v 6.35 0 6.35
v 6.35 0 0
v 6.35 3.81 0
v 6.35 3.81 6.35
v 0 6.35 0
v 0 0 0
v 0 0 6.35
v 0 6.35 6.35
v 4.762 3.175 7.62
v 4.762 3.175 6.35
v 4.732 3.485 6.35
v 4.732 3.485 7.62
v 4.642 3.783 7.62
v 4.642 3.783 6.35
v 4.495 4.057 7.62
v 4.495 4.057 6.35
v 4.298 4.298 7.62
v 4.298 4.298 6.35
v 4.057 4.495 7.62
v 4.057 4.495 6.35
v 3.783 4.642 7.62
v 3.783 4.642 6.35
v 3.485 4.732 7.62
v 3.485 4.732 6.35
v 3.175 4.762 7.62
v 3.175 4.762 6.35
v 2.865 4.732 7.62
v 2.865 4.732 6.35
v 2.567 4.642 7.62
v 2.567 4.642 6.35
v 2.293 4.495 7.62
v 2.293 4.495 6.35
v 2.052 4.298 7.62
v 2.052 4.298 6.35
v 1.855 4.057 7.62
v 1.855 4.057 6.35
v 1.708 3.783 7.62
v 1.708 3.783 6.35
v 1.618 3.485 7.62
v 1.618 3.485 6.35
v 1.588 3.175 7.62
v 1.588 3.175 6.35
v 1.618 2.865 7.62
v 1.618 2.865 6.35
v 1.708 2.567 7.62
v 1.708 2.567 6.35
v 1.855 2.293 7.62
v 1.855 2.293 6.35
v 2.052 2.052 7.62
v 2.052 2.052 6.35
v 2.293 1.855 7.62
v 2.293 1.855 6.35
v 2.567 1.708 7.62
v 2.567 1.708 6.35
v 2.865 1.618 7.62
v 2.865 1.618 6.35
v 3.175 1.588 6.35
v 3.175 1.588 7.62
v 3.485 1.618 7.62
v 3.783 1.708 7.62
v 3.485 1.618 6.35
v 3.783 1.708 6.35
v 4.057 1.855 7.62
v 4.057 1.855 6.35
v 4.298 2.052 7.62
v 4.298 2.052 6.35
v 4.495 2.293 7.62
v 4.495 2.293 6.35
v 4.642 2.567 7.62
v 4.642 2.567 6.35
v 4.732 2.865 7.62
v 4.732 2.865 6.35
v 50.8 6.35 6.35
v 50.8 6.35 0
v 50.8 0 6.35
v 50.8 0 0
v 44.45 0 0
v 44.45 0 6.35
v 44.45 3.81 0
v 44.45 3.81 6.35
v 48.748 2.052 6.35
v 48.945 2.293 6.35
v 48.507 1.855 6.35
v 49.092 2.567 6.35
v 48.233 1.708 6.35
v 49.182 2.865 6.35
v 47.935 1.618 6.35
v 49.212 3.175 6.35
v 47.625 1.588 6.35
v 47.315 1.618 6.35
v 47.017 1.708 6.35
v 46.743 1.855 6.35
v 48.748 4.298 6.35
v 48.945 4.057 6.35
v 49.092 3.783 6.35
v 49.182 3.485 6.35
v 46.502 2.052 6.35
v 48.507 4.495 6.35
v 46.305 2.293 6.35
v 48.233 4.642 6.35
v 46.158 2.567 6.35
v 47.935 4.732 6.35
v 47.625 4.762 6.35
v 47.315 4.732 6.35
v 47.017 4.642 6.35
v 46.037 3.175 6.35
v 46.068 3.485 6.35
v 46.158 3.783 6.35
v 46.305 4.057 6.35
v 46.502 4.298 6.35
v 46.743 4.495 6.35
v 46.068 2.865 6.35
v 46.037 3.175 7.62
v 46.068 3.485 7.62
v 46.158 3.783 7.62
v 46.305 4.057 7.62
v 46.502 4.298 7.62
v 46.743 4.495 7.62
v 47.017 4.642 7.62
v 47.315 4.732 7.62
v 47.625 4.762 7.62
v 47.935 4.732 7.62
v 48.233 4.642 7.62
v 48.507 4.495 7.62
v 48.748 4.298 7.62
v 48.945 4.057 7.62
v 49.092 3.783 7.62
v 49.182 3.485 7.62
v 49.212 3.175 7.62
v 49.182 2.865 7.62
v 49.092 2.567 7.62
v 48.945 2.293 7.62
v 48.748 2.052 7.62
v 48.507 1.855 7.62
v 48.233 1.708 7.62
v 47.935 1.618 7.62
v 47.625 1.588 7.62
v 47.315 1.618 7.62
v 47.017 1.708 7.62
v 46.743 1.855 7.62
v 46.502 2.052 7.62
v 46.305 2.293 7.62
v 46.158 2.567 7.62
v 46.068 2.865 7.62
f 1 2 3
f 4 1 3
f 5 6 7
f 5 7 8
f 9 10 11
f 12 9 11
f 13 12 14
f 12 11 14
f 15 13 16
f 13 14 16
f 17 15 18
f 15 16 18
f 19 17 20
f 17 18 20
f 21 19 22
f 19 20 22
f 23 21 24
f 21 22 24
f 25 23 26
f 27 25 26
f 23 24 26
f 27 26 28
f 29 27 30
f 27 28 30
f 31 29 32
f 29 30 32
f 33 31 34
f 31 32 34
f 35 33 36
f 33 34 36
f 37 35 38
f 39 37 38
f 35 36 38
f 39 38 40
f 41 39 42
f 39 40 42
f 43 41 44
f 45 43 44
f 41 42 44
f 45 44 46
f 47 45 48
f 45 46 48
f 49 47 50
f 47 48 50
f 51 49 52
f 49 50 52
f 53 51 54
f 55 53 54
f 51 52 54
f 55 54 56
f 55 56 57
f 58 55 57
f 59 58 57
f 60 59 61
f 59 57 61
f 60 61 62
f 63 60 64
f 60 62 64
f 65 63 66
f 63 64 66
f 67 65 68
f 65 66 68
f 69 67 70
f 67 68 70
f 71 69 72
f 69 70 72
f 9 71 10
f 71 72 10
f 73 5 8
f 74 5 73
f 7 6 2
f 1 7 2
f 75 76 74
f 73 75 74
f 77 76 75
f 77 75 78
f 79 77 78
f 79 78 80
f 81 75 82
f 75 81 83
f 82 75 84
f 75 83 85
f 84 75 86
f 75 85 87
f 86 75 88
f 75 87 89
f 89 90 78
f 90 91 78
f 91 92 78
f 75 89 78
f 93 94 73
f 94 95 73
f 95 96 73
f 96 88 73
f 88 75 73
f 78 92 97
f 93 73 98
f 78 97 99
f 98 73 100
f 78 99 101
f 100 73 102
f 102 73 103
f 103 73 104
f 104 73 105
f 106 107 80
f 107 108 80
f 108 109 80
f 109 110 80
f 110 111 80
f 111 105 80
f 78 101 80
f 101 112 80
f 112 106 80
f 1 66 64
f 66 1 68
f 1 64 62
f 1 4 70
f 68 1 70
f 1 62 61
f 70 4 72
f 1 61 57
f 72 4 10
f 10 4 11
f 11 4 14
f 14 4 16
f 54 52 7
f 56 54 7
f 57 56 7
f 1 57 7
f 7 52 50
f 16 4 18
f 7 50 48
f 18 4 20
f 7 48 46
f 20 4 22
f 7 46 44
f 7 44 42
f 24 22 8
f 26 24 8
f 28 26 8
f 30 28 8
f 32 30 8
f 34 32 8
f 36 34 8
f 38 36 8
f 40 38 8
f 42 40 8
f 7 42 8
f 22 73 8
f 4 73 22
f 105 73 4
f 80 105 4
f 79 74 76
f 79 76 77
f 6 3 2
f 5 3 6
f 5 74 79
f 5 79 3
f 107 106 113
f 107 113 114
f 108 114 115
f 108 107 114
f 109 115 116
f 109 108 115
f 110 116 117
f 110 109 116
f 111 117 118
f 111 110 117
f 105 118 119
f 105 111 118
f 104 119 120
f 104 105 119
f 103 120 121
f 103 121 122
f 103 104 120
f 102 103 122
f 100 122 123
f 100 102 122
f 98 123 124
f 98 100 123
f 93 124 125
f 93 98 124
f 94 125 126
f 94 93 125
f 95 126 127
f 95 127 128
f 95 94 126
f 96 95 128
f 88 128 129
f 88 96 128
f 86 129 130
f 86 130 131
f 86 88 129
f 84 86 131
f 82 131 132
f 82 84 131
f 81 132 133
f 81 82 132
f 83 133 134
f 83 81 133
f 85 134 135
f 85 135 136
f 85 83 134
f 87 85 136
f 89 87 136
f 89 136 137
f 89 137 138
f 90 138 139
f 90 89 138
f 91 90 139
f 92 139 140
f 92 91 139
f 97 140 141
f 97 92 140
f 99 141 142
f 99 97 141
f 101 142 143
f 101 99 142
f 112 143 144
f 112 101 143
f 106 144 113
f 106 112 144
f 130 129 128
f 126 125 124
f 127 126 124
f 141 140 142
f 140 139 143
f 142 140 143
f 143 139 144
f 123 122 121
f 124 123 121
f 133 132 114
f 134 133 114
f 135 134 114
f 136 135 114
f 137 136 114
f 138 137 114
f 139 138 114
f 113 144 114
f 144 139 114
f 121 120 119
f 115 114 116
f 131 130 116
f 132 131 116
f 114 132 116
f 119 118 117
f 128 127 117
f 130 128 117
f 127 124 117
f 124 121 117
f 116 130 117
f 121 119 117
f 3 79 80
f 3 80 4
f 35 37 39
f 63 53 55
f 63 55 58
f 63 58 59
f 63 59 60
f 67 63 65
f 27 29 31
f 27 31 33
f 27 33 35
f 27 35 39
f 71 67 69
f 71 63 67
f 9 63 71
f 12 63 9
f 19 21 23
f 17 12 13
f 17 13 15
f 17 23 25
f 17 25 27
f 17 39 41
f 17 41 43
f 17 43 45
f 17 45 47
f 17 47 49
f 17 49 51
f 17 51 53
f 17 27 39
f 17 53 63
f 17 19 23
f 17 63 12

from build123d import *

# Parameters (mm, degrees)
SKETCH1_W           = 6.35
SKETCH1_H           = 6.35
SKETCH1_W_2         = 19.05
SKETCH1_H_2         = 2.54
BOSS_EXTRUDE1_DEPTH = 6.35
SKETCH2_R           = 1.5875
BOSS_EXTRUDE2_DEPTH = 1.27


with BuildPart() as part:
    # Sketch1 → Boss-Extrude1 (new body)
    with BuildSketch(Plane.XY):
        with Locations((3.175, 3.175)):
            Rectangle(SKETCH1_W, SKETCH1_H)
        with Locations((15.875, 5.08)):
            Rectangle(SKETCH1_W_2, SKETCH1_H_2)
    boss_extrude1 = extrude(amount=BOSS_EXTRUDE1_DEPTH)

    # Sketch2 → Boss-Extrude2 (add)
    with BuildSketch(Plane.XY.offset(6.35)):
        with Locations((3.175, 3.175)):
            Circle(SKETCH2_R)
    boss_extrude2 = extrude(amount=BOSS_EXTRUDE2_DEPTH)

    # Mirror1: Boss-Extrude1, Boss-Extrude2 across plane
    add(boss_extrude1.mirror(Plane(origin=(25.4, 0, 6.35), x_dir=(0, 0, 1), z_dir=(1, 0, 0))))
    add(boss_extrude2.mirror(Plane(origin=(25.4, 0, 6.35), x_dir=(0, 0, 1), z_dir=(1, 0, 0))))


solid = part.part
